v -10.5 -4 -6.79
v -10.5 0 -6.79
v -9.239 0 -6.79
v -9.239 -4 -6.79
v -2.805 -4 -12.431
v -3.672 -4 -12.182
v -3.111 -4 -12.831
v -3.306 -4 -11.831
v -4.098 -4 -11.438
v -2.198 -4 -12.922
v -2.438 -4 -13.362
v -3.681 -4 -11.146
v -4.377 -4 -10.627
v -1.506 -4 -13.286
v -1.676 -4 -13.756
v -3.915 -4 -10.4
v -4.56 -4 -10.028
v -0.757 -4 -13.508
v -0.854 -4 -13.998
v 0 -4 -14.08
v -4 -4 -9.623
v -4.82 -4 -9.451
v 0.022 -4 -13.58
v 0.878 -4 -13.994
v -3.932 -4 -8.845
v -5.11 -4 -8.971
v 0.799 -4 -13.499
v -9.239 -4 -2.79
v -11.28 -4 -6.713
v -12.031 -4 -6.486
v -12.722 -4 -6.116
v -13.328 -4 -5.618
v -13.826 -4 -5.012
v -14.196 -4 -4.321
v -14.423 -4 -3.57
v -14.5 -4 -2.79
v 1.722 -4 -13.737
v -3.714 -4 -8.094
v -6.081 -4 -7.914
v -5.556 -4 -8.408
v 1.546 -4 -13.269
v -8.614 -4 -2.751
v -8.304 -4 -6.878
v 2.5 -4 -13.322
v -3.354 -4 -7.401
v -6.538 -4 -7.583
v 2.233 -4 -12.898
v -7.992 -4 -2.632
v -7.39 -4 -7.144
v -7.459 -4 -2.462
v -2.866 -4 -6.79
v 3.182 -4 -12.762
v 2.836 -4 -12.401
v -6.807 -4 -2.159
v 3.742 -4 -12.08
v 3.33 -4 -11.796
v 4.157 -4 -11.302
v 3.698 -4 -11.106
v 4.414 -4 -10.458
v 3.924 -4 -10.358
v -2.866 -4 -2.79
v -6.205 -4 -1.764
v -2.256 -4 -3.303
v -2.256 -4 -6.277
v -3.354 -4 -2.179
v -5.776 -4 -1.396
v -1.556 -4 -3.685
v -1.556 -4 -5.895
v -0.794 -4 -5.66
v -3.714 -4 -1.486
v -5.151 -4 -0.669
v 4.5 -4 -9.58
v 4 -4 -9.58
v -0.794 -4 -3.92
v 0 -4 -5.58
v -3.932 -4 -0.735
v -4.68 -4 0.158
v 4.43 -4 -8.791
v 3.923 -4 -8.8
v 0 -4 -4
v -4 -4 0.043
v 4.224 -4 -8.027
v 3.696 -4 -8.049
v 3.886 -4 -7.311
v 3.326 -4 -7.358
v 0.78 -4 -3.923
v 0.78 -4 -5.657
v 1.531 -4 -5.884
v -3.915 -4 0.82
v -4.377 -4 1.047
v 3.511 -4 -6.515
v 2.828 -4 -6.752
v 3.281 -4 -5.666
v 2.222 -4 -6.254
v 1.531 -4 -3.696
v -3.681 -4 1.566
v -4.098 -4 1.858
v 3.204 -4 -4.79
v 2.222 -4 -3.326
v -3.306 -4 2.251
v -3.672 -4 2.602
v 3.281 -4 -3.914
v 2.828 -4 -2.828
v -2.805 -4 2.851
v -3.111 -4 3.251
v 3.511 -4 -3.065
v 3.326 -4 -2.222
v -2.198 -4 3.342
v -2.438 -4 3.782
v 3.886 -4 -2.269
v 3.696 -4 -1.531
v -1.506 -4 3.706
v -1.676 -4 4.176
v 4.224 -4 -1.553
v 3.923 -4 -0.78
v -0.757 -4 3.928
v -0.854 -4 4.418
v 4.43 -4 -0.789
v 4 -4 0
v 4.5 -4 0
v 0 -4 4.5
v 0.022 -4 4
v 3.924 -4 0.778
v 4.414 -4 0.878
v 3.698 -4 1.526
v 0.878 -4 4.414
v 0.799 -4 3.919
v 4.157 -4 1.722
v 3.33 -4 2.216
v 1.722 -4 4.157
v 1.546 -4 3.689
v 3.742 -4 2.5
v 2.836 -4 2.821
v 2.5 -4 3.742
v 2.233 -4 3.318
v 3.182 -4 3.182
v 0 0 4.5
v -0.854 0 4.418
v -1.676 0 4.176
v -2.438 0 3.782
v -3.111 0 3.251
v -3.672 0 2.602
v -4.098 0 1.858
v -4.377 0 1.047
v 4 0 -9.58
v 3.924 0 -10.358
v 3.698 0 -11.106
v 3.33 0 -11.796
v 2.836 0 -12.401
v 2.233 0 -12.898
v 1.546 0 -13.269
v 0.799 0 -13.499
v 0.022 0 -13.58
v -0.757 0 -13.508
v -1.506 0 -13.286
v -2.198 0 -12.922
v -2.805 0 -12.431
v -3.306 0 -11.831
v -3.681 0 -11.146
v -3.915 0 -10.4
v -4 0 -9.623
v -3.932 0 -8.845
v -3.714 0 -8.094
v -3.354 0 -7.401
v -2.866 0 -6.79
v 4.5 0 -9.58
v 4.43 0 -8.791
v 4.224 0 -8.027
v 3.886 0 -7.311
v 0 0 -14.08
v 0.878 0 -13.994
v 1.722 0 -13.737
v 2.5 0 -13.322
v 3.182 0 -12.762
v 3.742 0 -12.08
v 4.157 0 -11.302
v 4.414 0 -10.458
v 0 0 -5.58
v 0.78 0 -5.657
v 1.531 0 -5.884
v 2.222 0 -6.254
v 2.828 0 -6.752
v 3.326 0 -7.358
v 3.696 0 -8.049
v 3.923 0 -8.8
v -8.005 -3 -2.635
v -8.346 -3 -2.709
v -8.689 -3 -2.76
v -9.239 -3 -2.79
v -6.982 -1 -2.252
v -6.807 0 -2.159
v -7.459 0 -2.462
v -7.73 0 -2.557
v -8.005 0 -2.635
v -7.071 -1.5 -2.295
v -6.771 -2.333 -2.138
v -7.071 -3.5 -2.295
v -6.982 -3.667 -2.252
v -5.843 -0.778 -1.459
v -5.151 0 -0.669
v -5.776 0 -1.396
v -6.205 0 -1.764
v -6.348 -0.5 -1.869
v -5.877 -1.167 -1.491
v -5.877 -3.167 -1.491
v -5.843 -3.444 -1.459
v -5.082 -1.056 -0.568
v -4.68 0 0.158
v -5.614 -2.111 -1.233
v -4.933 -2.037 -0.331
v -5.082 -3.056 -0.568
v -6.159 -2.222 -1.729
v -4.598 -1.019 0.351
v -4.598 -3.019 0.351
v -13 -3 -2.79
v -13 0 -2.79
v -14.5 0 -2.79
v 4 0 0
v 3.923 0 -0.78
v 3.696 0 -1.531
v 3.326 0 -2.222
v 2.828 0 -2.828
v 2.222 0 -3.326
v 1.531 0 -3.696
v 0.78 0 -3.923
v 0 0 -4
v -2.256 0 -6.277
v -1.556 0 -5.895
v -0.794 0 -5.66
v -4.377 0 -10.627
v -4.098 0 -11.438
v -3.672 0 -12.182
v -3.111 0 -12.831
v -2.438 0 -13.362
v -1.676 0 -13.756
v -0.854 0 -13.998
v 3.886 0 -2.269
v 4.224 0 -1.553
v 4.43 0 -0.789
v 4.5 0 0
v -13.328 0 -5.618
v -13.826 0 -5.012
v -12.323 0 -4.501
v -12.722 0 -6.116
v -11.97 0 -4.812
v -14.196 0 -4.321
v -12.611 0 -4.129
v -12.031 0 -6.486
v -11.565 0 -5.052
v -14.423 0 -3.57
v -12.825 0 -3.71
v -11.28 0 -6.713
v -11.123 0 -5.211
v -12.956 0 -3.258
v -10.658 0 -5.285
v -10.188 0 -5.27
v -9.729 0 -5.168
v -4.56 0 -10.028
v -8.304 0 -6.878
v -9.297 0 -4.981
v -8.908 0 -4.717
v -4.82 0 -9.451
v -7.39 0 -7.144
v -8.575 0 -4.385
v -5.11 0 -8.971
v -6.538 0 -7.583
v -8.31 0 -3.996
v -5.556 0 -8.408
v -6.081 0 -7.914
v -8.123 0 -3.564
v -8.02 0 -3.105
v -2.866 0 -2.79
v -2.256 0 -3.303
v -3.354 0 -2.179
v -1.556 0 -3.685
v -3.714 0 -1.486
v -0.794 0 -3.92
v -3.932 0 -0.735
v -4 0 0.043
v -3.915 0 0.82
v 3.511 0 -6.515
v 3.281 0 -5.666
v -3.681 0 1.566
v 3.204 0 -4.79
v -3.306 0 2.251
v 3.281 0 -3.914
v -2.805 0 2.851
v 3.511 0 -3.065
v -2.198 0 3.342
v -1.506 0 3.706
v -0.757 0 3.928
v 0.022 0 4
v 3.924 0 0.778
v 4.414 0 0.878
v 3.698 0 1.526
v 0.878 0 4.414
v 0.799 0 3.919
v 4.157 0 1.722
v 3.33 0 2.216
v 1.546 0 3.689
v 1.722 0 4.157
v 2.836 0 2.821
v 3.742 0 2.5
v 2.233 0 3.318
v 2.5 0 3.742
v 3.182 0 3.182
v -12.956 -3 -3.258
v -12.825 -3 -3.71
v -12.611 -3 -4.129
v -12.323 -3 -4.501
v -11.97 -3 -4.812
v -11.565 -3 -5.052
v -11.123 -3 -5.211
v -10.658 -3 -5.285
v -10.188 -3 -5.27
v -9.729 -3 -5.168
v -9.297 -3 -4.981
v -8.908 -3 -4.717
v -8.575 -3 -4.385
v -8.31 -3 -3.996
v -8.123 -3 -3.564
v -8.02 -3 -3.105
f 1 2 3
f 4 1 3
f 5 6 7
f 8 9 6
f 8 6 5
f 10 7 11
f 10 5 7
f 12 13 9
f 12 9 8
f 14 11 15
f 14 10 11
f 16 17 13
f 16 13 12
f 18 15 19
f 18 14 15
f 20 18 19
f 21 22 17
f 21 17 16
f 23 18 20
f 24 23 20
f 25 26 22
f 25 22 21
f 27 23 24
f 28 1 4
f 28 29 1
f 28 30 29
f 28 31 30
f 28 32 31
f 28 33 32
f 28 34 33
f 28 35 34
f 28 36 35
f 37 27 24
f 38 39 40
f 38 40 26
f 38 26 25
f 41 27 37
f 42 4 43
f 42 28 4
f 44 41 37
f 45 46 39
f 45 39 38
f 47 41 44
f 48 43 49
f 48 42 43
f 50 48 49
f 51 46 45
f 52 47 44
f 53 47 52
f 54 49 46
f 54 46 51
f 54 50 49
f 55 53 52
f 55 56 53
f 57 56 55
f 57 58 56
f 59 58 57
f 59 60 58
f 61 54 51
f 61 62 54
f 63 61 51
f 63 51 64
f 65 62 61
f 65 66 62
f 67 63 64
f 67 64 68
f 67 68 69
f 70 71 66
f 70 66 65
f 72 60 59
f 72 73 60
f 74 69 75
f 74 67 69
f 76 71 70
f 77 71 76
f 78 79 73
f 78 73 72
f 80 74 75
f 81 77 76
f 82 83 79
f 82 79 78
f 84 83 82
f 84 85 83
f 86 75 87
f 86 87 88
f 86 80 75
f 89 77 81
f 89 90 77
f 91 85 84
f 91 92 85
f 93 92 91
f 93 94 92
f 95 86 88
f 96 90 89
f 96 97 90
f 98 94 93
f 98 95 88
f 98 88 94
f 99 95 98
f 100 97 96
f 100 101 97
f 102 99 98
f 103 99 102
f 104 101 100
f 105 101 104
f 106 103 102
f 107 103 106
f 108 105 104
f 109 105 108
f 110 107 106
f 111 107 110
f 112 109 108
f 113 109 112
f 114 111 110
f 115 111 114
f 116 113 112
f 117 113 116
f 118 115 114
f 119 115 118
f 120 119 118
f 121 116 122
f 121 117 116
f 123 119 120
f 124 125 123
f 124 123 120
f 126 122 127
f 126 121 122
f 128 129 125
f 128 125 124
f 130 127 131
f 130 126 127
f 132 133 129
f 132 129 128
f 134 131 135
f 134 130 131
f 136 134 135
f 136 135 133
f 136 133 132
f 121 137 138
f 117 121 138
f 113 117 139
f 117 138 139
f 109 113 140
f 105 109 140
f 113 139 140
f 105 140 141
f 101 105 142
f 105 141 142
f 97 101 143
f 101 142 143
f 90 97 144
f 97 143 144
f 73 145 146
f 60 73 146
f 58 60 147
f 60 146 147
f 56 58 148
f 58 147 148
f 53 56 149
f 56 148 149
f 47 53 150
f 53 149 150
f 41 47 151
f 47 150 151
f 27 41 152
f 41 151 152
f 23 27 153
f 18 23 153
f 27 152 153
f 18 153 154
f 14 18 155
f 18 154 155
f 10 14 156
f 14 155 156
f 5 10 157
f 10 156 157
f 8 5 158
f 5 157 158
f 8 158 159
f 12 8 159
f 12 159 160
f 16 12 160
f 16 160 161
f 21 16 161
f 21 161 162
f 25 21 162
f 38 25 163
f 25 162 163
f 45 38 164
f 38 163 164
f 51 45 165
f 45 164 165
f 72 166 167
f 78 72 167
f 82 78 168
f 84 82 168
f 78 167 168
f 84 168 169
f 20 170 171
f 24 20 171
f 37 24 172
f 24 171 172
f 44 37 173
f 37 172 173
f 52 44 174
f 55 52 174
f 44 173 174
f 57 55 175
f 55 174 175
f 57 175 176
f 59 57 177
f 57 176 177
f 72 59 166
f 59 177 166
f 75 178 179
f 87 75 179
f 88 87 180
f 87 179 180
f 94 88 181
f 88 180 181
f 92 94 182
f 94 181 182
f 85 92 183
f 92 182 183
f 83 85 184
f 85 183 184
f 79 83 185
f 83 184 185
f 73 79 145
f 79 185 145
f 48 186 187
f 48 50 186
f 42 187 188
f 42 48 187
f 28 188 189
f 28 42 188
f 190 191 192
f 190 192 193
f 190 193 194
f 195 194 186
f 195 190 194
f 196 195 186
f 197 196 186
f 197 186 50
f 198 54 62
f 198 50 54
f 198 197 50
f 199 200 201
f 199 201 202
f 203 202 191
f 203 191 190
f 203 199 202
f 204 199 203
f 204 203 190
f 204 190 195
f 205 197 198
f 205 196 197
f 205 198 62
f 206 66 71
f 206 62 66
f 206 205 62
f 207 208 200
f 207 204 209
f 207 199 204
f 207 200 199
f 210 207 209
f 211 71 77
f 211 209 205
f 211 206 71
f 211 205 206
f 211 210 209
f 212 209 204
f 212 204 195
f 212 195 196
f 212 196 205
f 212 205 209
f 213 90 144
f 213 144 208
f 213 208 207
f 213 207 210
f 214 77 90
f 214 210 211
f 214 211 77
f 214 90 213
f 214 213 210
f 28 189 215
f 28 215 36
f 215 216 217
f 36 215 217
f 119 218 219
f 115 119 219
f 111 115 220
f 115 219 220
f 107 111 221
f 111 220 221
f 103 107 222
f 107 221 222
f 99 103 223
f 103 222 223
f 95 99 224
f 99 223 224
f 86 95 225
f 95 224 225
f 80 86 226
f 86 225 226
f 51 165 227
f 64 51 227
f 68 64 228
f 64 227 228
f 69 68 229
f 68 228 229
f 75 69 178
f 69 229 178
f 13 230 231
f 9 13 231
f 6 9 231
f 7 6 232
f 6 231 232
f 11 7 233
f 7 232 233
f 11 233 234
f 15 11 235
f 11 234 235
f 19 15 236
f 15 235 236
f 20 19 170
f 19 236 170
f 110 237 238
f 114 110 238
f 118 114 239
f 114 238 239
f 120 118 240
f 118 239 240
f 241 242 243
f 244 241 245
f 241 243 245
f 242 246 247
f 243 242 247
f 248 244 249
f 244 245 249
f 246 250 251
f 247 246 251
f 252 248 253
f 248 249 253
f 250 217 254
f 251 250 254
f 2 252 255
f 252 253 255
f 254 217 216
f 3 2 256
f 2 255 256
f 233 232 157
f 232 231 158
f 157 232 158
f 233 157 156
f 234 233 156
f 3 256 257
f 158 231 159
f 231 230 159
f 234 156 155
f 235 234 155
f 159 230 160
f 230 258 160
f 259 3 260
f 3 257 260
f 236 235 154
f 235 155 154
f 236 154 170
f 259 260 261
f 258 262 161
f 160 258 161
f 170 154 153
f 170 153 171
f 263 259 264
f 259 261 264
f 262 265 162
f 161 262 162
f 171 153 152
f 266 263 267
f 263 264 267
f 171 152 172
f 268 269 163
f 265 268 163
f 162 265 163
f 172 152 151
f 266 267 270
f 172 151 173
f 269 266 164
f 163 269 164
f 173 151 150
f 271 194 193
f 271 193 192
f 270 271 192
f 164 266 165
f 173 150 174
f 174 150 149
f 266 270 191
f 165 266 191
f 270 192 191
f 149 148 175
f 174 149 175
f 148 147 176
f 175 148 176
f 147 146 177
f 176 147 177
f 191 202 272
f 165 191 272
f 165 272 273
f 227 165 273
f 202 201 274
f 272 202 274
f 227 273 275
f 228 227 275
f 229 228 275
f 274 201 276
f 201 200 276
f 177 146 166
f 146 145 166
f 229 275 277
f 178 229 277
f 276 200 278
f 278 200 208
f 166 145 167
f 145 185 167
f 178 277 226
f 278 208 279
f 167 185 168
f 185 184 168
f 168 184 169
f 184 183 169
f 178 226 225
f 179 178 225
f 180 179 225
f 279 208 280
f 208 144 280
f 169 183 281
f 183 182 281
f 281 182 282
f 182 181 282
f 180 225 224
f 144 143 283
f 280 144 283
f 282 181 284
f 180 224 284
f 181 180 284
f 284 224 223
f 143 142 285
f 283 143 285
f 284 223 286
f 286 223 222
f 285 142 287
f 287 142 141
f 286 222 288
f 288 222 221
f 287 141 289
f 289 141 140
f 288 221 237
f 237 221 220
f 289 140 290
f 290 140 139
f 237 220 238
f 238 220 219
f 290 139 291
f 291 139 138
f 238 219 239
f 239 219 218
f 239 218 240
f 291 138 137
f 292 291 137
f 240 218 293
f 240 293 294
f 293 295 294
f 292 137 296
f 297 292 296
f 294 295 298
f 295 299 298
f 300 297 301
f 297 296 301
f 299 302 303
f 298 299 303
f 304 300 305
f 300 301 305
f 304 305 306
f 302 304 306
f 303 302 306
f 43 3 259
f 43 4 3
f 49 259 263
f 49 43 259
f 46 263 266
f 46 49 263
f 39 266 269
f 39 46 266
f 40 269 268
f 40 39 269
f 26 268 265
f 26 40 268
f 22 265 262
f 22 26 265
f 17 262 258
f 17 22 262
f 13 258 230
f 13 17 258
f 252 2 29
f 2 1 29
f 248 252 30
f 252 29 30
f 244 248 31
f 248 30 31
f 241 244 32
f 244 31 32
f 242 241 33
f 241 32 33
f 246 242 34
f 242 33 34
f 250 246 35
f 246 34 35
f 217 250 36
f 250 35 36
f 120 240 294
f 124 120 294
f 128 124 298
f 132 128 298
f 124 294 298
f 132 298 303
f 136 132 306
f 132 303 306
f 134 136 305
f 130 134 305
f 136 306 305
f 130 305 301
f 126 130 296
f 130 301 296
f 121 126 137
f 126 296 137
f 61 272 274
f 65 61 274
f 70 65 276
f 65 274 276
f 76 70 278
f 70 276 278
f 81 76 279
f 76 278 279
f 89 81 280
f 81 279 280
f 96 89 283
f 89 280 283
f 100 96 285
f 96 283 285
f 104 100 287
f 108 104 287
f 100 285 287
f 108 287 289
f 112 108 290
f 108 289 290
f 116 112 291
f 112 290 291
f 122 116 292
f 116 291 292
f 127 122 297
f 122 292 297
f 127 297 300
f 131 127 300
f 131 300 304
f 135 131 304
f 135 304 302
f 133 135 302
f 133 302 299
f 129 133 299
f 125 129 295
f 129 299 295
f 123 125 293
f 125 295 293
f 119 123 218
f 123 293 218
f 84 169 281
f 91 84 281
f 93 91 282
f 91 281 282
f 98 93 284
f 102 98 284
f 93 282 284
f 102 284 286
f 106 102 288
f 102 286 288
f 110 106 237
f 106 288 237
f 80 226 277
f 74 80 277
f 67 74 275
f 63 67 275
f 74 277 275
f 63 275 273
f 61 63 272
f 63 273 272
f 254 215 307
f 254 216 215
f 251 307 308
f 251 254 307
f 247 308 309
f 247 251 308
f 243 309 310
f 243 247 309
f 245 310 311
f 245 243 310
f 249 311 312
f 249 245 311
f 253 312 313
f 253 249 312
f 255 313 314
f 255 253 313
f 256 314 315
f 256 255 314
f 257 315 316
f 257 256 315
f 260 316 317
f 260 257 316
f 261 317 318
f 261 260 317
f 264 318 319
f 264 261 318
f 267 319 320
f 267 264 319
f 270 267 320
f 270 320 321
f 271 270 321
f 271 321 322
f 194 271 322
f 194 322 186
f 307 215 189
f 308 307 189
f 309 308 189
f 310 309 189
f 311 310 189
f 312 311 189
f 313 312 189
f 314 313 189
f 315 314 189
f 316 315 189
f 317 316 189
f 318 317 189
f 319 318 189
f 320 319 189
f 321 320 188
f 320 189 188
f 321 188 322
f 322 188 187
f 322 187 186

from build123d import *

# Parameters (mm, degrees)
F1_DEPTH = 4
F2_R     = 5
F3_R     = 3.99999
F4_DEPTH = 3


# Not quite as in the source:
# - a fillet or chamfer is up to 0.001 mm smaller than in the source, because OpenCascade refuses the exact size
# - a feature names something its author has since deleted; it is built from what else it names


with BuildPart() as f1:
    # F0 (on Front) → F1 (new body)
    with BuildSketch(Plane.XZ):
        with BuildLine():
            Line((-4.5, -6.79), (-4.5, -2.79))
            Line((-4.5, -2.79), (-8, -2.79))
            ThreePointArc((-8, -2.79), (-10.5, -5.29), (-13, -2.79))
            Line((-13, -2.79), (-14.5, -2.79))
            Line((-14.5, -2.79), (-14.5, -6.79))
            Line((-14.5, -6.79), (-4.5, -6.79))
        make_face()
        with BuildLine():
            ThreePointArc((-13, -2.79), (-10.5, -5.29), (-8, -2.79))
            Line((-8, -2.79), (-13, -2.79))
        make_face()
        with BuildLine():
            Line((-3.5307081443, -2.79), (-4.5, -2.79))
            Line((-4.5, -2.79), (-4.5, -6.79))
            Line((-4.5, -6.79), (-3.5307081443, -6.79))
            ThreePointArc((-3.5307081443, -6.79), (-1.9615045246, -5.53), (0, -5.08))
            Line((0, -5.08), (0, -4.5))
            ThreePointArc((0, -4.5), (-1.9615045246, -4.05), (-3.5307081443, -2.79))
        make_face()
        with BuildLine():
            ThreePointArc((4.5, 0), (3.1819805153, 3.1819805153), (0, 4.5))
            ThreePointArc((0, 4.5), (-3.1819805153, 3.1819805153), (-4.5, 0))
            ThreePointArc((-4.5, 0), (-4.2507756145, -1.4767893131), (-3.5307081443, -2.79))
            Line((-3.5307081443, -2.79), (-2.8663391286, -2.79))
            ThreePointArc((-2.8663391286, -2.79), (-1.5057628442, 3.7057628442), (4, 0))
            ThreePointArc((4, 0), (2.8284271247, -2.8284271247), (0, -4))
            Line((0, -4), (0, -4.5))
            ThreePointArc((0, -4.5), (2.2405062847, -3.9025801194), (3.8861134595, -2.2689473726))
            ThreePointArc((3.8861134595, -2.2689473726), (4.3438180537, -1.1752636794), (4.5, 0))
        make_face()
        with BuildLine():
            Line((-2.8663391286, -2.79), (-3.5307081443, -2.79))
            ThreePointArc((-3.5307081443, -2.79), (-1.9615045246, -4.05), (0, -4.5))
            Line((0, -4.5), (0, -4))
            ThreePointArc((0, -4), (-1.5556349186, -3.6851051545), (-2.8663391286, -2.79))
        make_face()
        with BuildLine():
            ThreePointArc((0, -5.08), (-1.9615045246, -5.53), (-3.5307081443, -6.79))
            Line((-3.5307081443, -6.79), (-2.8663391286, -6.79))
            ThreePointArc((-2.8663391286, -6.79), (-1.5556349186, -5.8948948455), (0, -5.58))
            Line((0, -5.58), (0, -5.08))
        make_face()
        with BuildLine():
            ThreePointArc((4.5, -9.58), (4.3438180596, -8.4047363422), (3.886113482, -7.3110526659))
            ThreePointArc((3.886113482, -7.3110526659), (2.240506304, -5.6774198917), (0, -5.08))
            Line((0, -5.08), (0, -5.58))
            ThreePointArc((0, -5.58), (2.8284271247, -6.7515728753), (4, -9.58))
            ThreePointArc((4, -9.58), (-1.5057628442, -13.2857628442), (-2.8663391286, -6.79))
            Line((-2.8663391286, -6.79), (-3.5307081443, -6.79))
            ThreePointArc((-3.5307081443, -6.79), (-4.2507756145, -8.1032106869), (-4.5, -9.58))
            ThreePointArc((-4.5, -9.58), (-3.1819805153, -12.7619805153), (0, -14.08))
            ThreePointArc((0, -14.08), (3.1819805153, -12.7619805153), (4.5, -9.58))
        make_face()
        with BuildLine():
            Line((-3.5307081443, -6.79), (-4.5, -6.79))
            Line((-4.5, -6.79), (-4.5, -9.58))
            ThreePointArc((-4.5, -9.58), (-4.2507756145, -8.1032106869), (-3.5307081443, -6.79))
        make_face()
        with BuildLine():
            ThreePointArc((-3.5307081443, -2.79), (-4.2507756145, -1.4767893131), (-4.5, 0))
            Line((-4.5, 0), (-4.5, -2.79))
            Line((-4.5, -2.79), (-3.5307081443, -2.79))
        make_face()
        with BuildLine():
            ThreePointArc((3.886113482, -7.3110526659), (3.2040173086, -4.7900000223), (3.8861134595, -2.2689473726))
            ThreePointArc((3.8861134595, -2.2689473726), (2.2405062847, -3.9025801194), (0, -4.5))
            Line((0, -4.5), (0, -5.08))
            ThreePointArc((0, -5.08), (2.240506304, -5.6774198917), (3.886113482, -7.3110526659))
        make_face()
    extrude(amount=F1_DEPTH)

    # F2
    f2_edges = [f1.edges().sort_by_distance(p)[0] for p in [
        (-4.5, -2, -2.79),
        (-4.5, -2, -6.79),
    ]]
    fillet(f2_edges, radius=F2_R)

    # F3 (radius 4 in the source; OpenCascade refuses exactly that, so slightly less here)
    f3_edges = [f1.edges().sort_by_distance(p)[0] for p in [
        (-14.5, -2, -6.79),
    ]]
    fillet(f3_edges, radius=F3_R)

    # F0 (on Front) → F4 (cut)
    with BuildSketch(Plane.XZ):
        with BuildLine():
            ThreePointArc((-13, -2.79), (-10.5, -5.29), (-8, -2.79))
            Line((-8, -2.79), (-13, -2.79))
        make_face()
        with BuildLine():
            Line((-13, -2.79), (-8, -2.79))
            ThreePointArc((-8, -2.79), (-10.5, -0.29), (-13, -2.79))
        make_face()
    extrude(amount=F4_DEPTH, mode=Mode.SUBTRACT)


solid = f1.part
